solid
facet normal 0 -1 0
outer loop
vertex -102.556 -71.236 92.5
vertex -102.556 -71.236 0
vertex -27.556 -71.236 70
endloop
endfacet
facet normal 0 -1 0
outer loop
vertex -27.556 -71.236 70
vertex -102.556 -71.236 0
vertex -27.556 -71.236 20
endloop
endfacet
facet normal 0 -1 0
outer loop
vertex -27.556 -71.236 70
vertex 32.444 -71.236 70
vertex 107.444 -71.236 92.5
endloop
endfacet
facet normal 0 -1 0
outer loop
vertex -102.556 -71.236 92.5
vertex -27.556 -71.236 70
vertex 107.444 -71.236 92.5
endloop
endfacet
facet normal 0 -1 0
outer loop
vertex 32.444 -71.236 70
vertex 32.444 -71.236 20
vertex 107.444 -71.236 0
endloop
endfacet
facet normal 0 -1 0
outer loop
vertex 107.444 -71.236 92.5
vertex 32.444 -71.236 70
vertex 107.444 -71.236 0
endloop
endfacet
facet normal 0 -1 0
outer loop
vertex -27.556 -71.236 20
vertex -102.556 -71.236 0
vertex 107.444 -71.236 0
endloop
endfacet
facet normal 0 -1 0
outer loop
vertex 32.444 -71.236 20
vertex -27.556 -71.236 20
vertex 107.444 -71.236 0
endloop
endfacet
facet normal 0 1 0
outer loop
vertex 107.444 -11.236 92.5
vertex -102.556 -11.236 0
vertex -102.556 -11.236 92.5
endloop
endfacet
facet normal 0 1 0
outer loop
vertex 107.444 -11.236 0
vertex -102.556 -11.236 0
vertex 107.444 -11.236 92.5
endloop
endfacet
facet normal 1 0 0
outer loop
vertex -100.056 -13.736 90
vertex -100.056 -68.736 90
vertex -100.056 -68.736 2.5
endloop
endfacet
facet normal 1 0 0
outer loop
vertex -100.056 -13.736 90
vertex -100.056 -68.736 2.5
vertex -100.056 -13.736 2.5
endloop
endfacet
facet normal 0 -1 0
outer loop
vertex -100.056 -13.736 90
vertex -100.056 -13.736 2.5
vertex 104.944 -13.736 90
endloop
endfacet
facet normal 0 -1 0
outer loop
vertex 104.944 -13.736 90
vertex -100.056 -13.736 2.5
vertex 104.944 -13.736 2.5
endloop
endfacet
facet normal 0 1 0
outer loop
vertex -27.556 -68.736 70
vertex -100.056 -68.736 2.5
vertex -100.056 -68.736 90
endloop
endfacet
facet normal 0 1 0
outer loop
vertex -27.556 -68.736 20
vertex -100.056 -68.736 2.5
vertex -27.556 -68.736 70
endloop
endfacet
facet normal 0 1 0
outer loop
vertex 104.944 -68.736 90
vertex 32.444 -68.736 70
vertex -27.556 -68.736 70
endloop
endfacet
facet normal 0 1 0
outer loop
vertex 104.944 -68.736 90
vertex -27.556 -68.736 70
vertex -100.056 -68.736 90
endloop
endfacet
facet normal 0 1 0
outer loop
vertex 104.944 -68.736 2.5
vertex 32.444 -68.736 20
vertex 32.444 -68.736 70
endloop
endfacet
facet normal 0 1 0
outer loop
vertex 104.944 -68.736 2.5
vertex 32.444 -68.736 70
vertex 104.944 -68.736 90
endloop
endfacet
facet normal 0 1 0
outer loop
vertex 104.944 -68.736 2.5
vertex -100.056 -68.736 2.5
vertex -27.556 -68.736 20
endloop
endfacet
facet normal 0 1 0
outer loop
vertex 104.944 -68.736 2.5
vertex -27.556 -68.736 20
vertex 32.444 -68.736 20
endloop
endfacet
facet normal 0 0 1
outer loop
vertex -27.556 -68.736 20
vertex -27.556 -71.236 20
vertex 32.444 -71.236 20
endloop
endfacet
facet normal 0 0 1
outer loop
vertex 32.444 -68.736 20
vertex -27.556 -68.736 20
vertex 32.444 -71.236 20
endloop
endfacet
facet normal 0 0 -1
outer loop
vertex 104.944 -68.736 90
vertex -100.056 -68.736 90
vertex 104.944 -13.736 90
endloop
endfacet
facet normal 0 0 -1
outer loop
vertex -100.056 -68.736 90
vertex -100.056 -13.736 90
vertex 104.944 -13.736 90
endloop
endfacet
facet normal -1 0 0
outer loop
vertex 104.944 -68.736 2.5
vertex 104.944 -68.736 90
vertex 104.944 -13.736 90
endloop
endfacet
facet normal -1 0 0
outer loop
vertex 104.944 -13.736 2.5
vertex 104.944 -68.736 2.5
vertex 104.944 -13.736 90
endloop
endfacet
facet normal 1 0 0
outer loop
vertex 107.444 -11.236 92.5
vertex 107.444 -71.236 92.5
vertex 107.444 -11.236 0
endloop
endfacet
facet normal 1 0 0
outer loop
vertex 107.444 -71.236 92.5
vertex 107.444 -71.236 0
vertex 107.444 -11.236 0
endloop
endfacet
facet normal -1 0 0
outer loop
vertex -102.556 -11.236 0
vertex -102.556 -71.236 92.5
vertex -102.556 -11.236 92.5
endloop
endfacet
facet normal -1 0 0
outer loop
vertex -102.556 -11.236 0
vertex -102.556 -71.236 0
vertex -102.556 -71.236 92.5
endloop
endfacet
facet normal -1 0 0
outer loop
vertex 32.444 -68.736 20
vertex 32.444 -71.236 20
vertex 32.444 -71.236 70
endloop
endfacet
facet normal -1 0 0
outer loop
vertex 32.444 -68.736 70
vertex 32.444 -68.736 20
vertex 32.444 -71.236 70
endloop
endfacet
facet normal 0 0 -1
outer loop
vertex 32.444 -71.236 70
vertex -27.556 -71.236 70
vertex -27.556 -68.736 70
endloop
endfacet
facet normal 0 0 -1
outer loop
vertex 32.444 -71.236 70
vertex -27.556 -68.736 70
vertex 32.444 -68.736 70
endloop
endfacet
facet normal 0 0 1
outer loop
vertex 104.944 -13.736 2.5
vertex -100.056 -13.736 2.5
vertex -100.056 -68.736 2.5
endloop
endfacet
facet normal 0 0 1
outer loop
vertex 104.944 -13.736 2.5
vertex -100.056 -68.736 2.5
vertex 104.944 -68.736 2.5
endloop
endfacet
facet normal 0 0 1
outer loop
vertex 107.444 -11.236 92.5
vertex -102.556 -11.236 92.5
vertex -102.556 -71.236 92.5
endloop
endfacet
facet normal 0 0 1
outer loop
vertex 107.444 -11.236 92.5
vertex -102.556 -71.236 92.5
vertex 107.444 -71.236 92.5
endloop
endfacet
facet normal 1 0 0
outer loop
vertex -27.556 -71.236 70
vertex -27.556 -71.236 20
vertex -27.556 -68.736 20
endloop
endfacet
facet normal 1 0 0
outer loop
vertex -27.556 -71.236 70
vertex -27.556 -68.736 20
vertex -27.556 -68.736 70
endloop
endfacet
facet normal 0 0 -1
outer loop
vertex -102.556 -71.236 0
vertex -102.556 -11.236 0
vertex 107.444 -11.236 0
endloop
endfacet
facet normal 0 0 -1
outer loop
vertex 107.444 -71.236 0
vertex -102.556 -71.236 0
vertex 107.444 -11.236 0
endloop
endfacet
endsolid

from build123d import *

# Parameters (mm, degrees)
F0_W     = 210
F0_H     = 60
F1_DEPTH = 90
F2_T     = -2.5
F3_W     = 210
F3_H     = 60
F3_W_2   = 205
F3_H_2   = 55
F4_DEPTH = 2.5
F5_W     = 60
F5_H     = 50
F6_DEPTH = 25


with BuildPart() as f1:
    # F0 (on Top) → F1 (new body)
    with BuildSketch(Plane.XY):
        with Locations((2.4435054511, -41.2361205323)):
            Rectangle(F0_W, F0_H)
    extrude(amount=F1_DEPTH)

    # F2
    f2_openings = [f1.faces().sort_by_distance(p)[0] for p in [
        (2.443505, -41.236121, 90),
    ]]
    offset(amount=F2_T, openings=f2_openings)

    # F3 (on face) → F4 (join)
    with BuildSketch(Plane.XY.offset(90)):
        with Locations((2.4435054511, -41.2361205323)):
            Rectangle(F3_W, F3_H)
        with Locations((2.4435054511, -41.2361205323)):
            Rectangle(F3_W_2, F3_H_2, mode=Mode.SUBTRACT)
        with Locations((2.4435054511, -41.2361205323)):
            Rectangle(F3_W_2, F3_H_2)
    extrude(amount=F4_DEPTH)

    # F5 (on face) → F6 (cut)
    with BuildSketch(Plane.XZ.offset(71.2361205323)):
        with Locations((2.4435054511, 45)):
            Rectangle(F5_W, F5_H)
    extrude(amount=-F6_DEPTH, mode=Mode.SUBTRACT)


solid = f1.part
